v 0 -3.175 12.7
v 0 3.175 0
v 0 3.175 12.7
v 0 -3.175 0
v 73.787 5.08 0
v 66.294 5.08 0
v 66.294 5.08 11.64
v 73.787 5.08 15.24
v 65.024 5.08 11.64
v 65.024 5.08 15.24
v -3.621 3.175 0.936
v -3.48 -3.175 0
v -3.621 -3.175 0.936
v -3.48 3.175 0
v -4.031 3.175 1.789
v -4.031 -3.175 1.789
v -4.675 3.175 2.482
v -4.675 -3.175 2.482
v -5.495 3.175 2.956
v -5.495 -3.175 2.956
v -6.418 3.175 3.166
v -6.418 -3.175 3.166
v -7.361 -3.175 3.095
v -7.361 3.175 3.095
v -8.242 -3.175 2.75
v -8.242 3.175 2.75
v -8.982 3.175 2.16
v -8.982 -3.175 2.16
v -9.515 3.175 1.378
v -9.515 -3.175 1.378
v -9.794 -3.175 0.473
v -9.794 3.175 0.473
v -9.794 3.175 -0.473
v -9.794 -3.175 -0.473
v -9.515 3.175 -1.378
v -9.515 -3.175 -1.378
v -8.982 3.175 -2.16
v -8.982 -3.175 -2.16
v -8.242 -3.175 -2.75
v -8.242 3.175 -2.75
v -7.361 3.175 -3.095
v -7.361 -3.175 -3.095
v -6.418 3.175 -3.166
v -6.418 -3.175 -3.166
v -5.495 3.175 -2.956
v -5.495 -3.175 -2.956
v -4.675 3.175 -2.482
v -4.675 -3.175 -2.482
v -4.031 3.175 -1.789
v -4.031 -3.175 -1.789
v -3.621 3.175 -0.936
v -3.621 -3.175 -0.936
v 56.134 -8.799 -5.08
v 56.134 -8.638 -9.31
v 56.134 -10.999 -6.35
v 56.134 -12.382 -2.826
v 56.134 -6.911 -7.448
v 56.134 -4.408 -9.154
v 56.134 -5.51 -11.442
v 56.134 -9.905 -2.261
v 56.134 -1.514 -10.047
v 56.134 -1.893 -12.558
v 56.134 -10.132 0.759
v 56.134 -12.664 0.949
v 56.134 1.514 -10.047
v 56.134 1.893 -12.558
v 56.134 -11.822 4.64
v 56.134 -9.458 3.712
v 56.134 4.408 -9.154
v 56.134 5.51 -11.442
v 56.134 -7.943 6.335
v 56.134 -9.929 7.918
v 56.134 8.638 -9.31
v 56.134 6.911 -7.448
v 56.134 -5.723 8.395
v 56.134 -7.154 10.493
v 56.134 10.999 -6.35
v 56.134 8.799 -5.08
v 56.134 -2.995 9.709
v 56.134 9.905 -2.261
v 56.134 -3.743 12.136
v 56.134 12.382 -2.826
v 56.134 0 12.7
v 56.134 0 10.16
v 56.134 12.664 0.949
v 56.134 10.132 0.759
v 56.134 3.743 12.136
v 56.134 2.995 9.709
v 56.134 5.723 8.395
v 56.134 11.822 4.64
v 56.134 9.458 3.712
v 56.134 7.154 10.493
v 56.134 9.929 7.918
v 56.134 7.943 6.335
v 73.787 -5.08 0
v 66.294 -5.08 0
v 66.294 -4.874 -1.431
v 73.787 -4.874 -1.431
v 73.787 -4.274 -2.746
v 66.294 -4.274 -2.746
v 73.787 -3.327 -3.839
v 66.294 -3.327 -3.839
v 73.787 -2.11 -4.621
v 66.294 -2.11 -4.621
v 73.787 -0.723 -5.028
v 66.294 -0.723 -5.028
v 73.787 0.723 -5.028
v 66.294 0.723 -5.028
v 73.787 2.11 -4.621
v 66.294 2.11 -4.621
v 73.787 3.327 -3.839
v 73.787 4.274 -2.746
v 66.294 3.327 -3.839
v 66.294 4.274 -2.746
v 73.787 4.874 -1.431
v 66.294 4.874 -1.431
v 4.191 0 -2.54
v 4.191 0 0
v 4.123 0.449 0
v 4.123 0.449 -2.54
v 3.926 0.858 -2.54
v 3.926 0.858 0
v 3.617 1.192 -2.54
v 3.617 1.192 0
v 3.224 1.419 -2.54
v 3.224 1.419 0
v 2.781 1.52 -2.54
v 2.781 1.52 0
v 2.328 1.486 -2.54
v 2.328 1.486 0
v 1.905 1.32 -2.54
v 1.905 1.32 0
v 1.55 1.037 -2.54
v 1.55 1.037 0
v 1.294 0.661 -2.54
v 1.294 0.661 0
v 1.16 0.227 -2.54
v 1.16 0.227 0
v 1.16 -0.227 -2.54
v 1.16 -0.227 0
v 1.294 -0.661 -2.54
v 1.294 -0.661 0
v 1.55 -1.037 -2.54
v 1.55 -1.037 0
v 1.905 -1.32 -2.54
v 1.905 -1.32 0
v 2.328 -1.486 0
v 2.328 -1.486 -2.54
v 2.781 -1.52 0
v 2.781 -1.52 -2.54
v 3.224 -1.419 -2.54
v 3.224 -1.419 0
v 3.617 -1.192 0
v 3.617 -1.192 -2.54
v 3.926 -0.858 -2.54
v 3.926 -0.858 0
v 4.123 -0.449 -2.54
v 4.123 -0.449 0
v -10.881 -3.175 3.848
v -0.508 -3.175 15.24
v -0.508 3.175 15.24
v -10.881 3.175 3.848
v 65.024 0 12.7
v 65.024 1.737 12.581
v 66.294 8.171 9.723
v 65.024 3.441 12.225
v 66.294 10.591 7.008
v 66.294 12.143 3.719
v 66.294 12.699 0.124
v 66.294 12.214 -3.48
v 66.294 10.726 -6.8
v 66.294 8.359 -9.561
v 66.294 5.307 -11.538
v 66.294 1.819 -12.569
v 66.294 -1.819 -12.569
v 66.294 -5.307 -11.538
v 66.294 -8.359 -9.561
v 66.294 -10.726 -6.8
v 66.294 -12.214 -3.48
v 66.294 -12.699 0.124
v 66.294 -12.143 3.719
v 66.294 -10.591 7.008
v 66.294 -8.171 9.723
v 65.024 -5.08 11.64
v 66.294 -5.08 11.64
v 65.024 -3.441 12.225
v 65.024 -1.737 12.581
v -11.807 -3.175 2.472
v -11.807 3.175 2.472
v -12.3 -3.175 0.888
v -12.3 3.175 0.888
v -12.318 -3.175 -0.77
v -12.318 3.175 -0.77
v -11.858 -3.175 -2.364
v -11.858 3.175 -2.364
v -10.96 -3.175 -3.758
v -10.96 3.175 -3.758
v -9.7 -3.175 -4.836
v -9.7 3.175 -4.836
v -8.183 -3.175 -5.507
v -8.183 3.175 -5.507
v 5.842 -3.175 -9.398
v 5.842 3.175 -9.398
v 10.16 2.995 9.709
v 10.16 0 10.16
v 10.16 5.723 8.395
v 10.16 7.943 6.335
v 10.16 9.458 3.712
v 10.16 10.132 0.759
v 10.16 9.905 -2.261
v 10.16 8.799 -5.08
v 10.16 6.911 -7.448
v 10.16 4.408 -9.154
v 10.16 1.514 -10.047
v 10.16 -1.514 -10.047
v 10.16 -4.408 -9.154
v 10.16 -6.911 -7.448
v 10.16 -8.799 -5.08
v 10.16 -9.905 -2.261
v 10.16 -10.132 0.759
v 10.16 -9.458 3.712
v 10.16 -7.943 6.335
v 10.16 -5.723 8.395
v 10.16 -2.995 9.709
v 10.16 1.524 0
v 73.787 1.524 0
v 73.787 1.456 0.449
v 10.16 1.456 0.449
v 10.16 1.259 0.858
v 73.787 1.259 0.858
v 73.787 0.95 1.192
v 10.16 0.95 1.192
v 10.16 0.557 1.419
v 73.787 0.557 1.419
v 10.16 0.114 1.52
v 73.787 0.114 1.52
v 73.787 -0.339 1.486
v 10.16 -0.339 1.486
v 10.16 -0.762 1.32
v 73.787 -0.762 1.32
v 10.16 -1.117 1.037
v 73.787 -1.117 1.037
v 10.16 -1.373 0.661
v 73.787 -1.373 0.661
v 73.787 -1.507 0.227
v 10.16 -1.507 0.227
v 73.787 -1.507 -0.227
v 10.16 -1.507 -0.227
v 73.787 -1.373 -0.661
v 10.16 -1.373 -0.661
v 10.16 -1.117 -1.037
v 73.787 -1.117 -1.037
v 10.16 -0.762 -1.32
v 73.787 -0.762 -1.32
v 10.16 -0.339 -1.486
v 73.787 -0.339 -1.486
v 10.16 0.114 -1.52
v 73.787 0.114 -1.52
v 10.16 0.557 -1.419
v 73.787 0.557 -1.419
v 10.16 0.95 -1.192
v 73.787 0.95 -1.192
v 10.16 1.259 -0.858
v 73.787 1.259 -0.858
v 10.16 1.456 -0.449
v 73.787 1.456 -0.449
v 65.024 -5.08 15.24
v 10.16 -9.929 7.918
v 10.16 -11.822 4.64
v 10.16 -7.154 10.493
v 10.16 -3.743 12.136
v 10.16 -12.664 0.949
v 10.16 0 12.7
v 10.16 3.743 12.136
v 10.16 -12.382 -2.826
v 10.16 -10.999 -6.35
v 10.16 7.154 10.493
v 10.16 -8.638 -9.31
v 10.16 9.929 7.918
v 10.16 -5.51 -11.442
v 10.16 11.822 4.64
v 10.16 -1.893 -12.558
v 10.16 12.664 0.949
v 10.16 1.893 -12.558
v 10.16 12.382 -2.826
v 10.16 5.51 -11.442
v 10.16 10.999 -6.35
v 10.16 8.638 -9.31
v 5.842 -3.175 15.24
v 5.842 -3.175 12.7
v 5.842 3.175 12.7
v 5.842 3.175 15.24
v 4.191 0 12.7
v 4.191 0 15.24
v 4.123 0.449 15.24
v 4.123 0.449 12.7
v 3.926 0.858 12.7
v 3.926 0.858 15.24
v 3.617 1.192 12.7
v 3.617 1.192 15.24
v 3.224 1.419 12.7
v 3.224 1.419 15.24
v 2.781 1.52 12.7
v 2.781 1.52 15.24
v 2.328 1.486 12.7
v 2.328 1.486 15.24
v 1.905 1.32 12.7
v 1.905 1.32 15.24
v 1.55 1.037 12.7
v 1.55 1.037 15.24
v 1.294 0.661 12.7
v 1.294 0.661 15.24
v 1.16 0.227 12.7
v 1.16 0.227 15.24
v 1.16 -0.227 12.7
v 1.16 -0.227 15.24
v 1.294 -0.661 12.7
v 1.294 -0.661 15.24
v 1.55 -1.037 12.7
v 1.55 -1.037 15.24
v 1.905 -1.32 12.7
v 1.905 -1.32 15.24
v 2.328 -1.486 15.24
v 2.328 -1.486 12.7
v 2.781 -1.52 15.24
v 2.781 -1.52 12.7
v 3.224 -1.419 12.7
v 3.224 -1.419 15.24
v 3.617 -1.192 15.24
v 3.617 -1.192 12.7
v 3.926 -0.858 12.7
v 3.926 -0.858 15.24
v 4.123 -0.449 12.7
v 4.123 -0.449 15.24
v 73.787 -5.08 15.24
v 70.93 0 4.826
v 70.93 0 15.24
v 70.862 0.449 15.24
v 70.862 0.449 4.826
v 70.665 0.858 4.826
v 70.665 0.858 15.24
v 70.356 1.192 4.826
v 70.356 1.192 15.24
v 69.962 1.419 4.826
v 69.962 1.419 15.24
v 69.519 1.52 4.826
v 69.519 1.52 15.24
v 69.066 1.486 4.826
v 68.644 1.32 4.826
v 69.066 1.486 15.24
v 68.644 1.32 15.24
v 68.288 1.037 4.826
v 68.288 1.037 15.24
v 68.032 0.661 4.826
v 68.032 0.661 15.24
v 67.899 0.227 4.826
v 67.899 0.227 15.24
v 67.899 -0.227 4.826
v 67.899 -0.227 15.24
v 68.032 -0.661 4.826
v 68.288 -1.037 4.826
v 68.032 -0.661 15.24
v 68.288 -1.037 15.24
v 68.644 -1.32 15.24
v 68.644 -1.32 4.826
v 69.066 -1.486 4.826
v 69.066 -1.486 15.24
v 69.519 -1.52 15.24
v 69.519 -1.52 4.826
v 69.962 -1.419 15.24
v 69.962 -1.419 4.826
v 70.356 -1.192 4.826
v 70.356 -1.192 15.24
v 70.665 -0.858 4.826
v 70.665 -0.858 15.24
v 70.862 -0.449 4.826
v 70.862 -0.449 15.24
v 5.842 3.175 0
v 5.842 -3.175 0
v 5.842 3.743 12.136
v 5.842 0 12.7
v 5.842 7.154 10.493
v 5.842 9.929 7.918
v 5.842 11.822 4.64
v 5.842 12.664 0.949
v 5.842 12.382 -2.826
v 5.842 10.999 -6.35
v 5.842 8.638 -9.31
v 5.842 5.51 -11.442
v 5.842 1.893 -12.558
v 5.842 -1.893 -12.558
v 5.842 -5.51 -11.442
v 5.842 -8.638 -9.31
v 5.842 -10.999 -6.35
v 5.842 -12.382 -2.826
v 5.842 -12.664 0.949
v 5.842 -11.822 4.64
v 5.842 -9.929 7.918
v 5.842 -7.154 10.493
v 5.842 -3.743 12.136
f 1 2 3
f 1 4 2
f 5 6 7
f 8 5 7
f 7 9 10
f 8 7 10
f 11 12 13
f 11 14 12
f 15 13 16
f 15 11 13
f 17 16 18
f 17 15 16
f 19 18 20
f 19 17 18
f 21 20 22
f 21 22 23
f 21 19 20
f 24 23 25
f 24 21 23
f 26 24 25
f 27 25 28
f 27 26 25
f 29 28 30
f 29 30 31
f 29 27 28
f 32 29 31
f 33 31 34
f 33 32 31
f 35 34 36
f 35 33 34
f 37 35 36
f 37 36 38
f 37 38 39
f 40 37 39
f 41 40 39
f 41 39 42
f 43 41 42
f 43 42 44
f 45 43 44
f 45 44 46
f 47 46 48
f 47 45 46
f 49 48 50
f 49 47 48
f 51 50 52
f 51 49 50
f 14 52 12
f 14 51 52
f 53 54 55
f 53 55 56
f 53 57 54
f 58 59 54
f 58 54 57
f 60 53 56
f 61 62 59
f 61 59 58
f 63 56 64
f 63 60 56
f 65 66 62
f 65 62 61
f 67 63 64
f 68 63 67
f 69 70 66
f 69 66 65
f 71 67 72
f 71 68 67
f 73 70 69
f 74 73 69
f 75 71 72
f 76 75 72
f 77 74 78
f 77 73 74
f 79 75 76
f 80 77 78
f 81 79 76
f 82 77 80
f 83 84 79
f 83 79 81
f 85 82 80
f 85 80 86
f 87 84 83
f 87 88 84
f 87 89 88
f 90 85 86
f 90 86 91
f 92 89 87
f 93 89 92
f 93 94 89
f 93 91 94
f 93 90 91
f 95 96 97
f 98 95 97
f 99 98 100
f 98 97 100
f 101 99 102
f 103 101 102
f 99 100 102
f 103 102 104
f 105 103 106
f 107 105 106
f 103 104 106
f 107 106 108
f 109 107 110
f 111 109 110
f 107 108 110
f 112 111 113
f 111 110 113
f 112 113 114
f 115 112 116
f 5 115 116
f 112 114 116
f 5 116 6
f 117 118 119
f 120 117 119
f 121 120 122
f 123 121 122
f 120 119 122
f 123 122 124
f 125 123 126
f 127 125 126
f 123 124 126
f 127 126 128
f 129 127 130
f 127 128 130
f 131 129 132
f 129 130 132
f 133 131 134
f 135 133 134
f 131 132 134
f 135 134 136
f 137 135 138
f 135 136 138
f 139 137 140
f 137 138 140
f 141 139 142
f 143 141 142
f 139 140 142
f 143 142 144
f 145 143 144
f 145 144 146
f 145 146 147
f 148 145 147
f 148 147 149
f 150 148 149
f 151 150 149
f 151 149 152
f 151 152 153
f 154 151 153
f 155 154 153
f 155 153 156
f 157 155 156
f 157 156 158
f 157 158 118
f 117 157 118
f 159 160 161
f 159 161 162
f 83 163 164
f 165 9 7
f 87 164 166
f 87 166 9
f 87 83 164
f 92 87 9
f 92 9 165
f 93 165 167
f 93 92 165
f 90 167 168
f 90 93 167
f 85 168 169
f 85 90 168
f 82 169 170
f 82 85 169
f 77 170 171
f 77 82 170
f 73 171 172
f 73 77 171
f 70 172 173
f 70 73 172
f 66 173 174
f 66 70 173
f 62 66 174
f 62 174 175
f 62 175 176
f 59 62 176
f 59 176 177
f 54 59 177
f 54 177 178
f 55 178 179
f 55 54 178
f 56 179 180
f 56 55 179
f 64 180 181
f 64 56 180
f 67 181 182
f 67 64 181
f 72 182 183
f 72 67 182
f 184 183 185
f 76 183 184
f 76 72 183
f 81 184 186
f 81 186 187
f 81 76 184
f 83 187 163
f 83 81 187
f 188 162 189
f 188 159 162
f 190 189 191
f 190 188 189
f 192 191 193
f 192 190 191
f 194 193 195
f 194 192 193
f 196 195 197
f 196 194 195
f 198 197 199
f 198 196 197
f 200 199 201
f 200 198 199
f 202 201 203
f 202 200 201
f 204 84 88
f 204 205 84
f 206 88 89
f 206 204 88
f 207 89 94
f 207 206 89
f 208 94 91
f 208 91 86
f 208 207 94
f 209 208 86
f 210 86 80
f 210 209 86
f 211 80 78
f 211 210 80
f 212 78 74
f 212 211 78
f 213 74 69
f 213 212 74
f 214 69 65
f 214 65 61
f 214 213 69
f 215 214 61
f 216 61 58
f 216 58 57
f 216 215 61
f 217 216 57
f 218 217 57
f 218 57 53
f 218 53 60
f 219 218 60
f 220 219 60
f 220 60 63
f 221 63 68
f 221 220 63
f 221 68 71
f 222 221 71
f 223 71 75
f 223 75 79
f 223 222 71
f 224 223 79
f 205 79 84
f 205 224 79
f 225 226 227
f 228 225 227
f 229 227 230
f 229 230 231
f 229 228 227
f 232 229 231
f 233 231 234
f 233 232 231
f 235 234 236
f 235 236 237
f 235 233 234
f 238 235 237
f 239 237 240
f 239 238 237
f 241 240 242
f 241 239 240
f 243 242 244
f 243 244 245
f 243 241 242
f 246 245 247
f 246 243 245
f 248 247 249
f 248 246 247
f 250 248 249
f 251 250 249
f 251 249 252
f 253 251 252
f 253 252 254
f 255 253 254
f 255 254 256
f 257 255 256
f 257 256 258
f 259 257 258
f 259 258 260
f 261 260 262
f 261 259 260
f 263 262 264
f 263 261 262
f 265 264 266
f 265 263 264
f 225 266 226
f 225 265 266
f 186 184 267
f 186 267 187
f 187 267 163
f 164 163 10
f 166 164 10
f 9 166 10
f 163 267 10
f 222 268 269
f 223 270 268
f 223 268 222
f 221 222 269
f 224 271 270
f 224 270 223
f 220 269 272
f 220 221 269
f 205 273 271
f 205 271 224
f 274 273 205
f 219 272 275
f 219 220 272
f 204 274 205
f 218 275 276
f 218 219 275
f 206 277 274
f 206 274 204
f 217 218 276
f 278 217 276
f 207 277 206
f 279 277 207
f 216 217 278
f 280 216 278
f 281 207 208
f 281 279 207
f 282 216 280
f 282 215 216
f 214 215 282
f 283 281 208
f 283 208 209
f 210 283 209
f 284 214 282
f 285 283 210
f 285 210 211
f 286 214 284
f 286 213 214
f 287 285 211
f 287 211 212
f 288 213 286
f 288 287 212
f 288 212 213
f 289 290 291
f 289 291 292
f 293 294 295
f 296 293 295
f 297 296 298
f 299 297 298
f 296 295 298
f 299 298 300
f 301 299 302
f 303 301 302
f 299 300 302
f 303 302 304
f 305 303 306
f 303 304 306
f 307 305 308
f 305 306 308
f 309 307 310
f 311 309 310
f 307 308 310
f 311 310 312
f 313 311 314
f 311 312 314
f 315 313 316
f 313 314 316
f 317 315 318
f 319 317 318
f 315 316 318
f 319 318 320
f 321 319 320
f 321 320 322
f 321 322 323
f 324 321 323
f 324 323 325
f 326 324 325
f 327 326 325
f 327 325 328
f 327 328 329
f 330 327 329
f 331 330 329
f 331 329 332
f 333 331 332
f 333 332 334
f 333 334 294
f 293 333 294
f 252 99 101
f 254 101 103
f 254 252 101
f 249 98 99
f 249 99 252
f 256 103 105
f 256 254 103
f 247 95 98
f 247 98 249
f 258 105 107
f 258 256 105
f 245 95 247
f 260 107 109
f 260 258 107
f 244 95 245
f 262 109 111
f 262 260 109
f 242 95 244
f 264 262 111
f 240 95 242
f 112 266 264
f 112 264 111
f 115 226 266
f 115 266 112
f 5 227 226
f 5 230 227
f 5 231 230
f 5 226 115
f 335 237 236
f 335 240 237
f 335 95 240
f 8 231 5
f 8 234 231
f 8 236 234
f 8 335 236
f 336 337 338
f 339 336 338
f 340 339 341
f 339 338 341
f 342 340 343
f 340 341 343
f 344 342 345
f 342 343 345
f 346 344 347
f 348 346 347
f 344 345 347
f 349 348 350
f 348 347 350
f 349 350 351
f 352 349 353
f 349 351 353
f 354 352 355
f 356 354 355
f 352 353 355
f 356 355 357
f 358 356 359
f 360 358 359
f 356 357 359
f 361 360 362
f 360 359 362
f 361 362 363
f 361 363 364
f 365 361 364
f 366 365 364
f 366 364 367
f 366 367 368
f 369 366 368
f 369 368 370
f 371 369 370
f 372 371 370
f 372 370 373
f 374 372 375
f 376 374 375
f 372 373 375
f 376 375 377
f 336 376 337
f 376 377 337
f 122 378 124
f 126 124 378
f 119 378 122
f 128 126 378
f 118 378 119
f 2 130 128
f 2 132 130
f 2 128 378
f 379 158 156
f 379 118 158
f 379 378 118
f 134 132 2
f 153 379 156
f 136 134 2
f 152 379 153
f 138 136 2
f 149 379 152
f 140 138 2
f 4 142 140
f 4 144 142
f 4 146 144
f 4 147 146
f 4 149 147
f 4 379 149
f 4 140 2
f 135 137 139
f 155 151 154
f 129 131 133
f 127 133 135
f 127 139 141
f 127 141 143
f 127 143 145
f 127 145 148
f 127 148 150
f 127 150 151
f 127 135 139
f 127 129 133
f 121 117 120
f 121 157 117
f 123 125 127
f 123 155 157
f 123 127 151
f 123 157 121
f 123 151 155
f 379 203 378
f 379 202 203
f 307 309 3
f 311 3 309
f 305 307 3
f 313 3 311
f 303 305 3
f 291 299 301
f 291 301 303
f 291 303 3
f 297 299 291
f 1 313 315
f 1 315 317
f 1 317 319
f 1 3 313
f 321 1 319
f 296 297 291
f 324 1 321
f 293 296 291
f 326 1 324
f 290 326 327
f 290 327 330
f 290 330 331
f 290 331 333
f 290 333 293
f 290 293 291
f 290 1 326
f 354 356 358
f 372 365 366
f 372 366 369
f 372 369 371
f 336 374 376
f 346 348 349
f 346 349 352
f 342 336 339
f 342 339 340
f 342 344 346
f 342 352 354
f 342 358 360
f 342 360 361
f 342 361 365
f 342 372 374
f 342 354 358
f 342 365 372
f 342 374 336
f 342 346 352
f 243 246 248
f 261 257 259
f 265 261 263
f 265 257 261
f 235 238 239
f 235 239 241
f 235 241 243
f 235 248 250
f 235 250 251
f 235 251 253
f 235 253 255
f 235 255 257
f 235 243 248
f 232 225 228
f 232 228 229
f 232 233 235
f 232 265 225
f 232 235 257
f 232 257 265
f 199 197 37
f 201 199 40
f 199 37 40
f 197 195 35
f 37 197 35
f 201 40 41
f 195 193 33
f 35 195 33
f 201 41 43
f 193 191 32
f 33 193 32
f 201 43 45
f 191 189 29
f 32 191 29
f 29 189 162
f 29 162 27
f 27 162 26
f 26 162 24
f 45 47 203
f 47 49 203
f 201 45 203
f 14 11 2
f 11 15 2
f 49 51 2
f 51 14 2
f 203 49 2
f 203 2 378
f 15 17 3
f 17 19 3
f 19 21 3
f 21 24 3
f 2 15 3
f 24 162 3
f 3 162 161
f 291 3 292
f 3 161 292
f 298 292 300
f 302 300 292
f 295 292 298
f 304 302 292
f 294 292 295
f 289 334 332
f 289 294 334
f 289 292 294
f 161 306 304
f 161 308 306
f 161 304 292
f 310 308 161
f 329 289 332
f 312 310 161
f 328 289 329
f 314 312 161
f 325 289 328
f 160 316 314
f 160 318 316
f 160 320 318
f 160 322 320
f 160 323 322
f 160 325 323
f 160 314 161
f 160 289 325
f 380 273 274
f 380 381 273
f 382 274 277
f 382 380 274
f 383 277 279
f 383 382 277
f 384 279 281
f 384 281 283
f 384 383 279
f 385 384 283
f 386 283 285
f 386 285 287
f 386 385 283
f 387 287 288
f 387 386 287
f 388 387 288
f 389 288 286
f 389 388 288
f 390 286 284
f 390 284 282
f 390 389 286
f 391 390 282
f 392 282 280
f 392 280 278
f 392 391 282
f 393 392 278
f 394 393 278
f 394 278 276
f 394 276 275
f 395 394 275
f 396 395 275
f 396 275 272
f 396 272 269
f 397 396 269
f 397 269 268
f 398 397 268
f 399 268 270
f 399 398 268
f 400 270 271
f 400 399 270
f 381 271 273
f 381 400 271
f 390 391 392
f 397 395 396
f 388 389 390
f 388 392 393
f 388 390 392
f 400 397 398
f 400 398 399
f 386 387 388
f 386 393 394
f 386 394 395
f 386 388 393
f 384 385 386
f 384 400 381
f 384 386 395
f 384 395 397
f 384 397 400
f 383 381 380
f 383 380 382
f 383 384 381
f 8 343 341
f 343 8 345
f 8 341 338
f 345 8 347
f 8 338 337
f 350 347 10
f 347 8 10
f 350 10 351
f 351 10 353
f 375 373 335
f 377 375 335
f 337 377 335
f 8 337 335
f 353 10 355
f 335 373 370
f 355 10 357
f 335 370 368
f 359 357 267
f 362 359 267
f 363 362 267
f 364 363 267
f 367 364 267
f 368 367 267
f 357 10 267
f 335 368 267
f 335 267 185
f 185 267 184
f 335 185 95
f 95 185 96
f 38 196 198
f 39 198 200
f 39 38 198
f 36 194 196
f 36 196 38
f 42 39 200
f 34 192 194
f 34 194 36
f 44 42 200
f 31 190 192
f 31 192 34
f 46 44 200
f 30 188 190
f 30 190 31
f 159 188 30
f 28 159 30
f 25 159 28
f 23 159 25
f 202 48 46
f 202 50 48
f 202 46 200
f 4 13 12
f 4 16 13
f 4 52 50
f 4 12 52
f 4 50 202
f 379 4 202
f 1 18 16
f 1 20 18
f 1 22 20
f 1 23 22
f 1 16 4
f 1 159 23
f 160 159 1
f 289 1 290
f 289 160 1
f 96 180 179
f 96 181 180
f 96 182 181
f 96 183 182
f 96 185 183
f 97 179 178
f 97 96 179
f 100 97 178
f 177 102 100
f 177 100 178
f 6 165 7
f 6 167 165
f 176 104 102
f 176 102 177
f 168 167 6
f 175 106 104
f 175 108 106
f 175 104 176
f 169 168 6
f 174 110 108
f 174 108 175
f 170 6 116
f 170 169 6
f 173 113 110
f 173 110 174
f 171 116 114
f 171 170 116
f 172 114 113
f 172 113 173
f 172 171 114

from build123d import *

# Parameters (mm, degrees)
F0_R      = 3.175
F1_DEPTH  = 3.175
F3_R      = 1.524
F4_DEPTH  = 1.27
F5_DEPTH  = 7.493
F6_DEPTH  = 56.134
F7_R      = 1.524
F9_DEPTH  = 10.414
F8_R      = 1.524
F10_DEPTH = 17.78


with BuildPart() as f1:
    # F0 (on Front) → F1 (new body, symmetric)
    with BuildSketch(Plane.XZ):
        with BuildLine():
            Line((-0.9398, 0), (0, 0))
            Line((0, 0), (0, 12.7))
            Line((0, 12.7), (5.842, 12.7))
            Line((5.842, 12.7), (5.842, 15.24))
            Line((5.842, 15.24), (-0.508, 15.24))
            Line((-0.508, 15.24), (-10.88063, 3.847543))
            ThreePointArc((-10.88063, 3.847543), (-4.591961, 5.329721), (-0.9398, 0))
        make_face()
        with BuildLine():
            Line((5.842, 0), (0, 0))
            Line((0, 0), (-0.9398, 0))
            ThreePointArc((-0.9398, 0), (-3.195791, -4.549339), (-8.182663, -5.506983))
            Line((-8.182663, -5.506983), (5.842, -9.398))
            Line((5.842, -9.398), (5.842, 0))
        make_face()
        with BuildLine():
            ThreePointArc((-8.182663, -5.506983), (-3.195791, -4.549339), (-0.9398, 0))
            ThreePointArc((-0.9398, 0), (-4.591961, 5.329721), (-10.88063, 3.847543))
            ThreePointArc((-10.88063, 3.847543), (-12.145978, -1.583727), (-8.182663, -5.506983))
        make_face()
        with Locations((-6.6548, 0)):
            Circle(F0_R, mode=Mode.SUBTRACT)
    extrude(amount=F1_DEPTH, both=True)

    # F8 (on face) → F10 (cut)
    with BuildSketch(Plane.XY.offset(15.24)):
        with Locations((2.667, 0)):
            Circle(F8_R)
    extrude(amount=-F10_DEPTH, mode=Mode.SUBTRACT)


with BuildPart() as f2:
    # F0 (on Front) → F2 (revolve)
    with BuildSketch(Plane.XZ):
        Polygon((5.842, 12.7), (5.842, 0), (66.294, 0), (66.294, 12.7), (56.134, 12.7), (56.134, 10.16), (10.16, 10.16), (10.16, 12.7), align=None)
    revolve(axis=Axis((33.147, 0, 0), (-1, 0, 0)))

    # F3 (on face) → F4 (join)
    with BuildSketch(Plane.YZ.offset(66.294)):
        with BuildLine():
            ThreePointArc((-5.08, 0), (0, -5.08), (5.08, 0))
            ThreePointArc((5.08, 0), (0, 5.08), (-5.08, 0))
        make_face()
        Circle(F3_R, mode=Mode.SUBTRACT)
        with BuildLine():
            ThreePointArc((-5.08, 0), (0, 5.08), (5.08, 0))
            Line((5.08, 0), (5.08, 15.24))
            Line((5.08, 15.24), (-5.08, 15.24))
            Line((-5.08, 15.24), (-5.08, 0))
        make_face()
    extrude(amount=-F4_DEPTH)

    # F3 (on face) → F5 (join)
    with BuildSketch(Plane.YZ.offset(66.294)):
        with BuildLine():
            ThreePointArc((-5.08, 0), (0, -5.08), (5.08, 0))
            ThreePointArc((5.08, 0), (0, 5.08), (-5.08, 0))
        make_face()
        Circle(F3_R, mode=Mode.SUBTRACT)
        with BuildLine():
            ThreePointArc((-5.08, 0), (0, 5.08), (5.08, 0))
            Line((5.08, 0), (5.08, 15.24))
            Line((5.08, 15.24), (-5.08, 15.24))
            Line((-5.08, 15.24), (-5.08, 0))
        make_face()
    extrude(amount=F5_DEPTH)

    # F3 (on face) → F6 (cut, through all)
    with BuildSketch(Plane.YZ.offset(66.294)):
        Circle(F3_R)
    extrude(amount=-F6_DEPTH, mode=Mode.SUBTRACT)

    # F7 (on face) → F9 (cut)
    with BuildSketch(Plane.XY.offset(15.24)):
        with Locations((69.4055, 0)):
            Circle(F7_R)
    extrude(amount=-F9_DEPTH, mode=Mode.SUBTRACT)


solid = Compound([f1.part, f2.part])
